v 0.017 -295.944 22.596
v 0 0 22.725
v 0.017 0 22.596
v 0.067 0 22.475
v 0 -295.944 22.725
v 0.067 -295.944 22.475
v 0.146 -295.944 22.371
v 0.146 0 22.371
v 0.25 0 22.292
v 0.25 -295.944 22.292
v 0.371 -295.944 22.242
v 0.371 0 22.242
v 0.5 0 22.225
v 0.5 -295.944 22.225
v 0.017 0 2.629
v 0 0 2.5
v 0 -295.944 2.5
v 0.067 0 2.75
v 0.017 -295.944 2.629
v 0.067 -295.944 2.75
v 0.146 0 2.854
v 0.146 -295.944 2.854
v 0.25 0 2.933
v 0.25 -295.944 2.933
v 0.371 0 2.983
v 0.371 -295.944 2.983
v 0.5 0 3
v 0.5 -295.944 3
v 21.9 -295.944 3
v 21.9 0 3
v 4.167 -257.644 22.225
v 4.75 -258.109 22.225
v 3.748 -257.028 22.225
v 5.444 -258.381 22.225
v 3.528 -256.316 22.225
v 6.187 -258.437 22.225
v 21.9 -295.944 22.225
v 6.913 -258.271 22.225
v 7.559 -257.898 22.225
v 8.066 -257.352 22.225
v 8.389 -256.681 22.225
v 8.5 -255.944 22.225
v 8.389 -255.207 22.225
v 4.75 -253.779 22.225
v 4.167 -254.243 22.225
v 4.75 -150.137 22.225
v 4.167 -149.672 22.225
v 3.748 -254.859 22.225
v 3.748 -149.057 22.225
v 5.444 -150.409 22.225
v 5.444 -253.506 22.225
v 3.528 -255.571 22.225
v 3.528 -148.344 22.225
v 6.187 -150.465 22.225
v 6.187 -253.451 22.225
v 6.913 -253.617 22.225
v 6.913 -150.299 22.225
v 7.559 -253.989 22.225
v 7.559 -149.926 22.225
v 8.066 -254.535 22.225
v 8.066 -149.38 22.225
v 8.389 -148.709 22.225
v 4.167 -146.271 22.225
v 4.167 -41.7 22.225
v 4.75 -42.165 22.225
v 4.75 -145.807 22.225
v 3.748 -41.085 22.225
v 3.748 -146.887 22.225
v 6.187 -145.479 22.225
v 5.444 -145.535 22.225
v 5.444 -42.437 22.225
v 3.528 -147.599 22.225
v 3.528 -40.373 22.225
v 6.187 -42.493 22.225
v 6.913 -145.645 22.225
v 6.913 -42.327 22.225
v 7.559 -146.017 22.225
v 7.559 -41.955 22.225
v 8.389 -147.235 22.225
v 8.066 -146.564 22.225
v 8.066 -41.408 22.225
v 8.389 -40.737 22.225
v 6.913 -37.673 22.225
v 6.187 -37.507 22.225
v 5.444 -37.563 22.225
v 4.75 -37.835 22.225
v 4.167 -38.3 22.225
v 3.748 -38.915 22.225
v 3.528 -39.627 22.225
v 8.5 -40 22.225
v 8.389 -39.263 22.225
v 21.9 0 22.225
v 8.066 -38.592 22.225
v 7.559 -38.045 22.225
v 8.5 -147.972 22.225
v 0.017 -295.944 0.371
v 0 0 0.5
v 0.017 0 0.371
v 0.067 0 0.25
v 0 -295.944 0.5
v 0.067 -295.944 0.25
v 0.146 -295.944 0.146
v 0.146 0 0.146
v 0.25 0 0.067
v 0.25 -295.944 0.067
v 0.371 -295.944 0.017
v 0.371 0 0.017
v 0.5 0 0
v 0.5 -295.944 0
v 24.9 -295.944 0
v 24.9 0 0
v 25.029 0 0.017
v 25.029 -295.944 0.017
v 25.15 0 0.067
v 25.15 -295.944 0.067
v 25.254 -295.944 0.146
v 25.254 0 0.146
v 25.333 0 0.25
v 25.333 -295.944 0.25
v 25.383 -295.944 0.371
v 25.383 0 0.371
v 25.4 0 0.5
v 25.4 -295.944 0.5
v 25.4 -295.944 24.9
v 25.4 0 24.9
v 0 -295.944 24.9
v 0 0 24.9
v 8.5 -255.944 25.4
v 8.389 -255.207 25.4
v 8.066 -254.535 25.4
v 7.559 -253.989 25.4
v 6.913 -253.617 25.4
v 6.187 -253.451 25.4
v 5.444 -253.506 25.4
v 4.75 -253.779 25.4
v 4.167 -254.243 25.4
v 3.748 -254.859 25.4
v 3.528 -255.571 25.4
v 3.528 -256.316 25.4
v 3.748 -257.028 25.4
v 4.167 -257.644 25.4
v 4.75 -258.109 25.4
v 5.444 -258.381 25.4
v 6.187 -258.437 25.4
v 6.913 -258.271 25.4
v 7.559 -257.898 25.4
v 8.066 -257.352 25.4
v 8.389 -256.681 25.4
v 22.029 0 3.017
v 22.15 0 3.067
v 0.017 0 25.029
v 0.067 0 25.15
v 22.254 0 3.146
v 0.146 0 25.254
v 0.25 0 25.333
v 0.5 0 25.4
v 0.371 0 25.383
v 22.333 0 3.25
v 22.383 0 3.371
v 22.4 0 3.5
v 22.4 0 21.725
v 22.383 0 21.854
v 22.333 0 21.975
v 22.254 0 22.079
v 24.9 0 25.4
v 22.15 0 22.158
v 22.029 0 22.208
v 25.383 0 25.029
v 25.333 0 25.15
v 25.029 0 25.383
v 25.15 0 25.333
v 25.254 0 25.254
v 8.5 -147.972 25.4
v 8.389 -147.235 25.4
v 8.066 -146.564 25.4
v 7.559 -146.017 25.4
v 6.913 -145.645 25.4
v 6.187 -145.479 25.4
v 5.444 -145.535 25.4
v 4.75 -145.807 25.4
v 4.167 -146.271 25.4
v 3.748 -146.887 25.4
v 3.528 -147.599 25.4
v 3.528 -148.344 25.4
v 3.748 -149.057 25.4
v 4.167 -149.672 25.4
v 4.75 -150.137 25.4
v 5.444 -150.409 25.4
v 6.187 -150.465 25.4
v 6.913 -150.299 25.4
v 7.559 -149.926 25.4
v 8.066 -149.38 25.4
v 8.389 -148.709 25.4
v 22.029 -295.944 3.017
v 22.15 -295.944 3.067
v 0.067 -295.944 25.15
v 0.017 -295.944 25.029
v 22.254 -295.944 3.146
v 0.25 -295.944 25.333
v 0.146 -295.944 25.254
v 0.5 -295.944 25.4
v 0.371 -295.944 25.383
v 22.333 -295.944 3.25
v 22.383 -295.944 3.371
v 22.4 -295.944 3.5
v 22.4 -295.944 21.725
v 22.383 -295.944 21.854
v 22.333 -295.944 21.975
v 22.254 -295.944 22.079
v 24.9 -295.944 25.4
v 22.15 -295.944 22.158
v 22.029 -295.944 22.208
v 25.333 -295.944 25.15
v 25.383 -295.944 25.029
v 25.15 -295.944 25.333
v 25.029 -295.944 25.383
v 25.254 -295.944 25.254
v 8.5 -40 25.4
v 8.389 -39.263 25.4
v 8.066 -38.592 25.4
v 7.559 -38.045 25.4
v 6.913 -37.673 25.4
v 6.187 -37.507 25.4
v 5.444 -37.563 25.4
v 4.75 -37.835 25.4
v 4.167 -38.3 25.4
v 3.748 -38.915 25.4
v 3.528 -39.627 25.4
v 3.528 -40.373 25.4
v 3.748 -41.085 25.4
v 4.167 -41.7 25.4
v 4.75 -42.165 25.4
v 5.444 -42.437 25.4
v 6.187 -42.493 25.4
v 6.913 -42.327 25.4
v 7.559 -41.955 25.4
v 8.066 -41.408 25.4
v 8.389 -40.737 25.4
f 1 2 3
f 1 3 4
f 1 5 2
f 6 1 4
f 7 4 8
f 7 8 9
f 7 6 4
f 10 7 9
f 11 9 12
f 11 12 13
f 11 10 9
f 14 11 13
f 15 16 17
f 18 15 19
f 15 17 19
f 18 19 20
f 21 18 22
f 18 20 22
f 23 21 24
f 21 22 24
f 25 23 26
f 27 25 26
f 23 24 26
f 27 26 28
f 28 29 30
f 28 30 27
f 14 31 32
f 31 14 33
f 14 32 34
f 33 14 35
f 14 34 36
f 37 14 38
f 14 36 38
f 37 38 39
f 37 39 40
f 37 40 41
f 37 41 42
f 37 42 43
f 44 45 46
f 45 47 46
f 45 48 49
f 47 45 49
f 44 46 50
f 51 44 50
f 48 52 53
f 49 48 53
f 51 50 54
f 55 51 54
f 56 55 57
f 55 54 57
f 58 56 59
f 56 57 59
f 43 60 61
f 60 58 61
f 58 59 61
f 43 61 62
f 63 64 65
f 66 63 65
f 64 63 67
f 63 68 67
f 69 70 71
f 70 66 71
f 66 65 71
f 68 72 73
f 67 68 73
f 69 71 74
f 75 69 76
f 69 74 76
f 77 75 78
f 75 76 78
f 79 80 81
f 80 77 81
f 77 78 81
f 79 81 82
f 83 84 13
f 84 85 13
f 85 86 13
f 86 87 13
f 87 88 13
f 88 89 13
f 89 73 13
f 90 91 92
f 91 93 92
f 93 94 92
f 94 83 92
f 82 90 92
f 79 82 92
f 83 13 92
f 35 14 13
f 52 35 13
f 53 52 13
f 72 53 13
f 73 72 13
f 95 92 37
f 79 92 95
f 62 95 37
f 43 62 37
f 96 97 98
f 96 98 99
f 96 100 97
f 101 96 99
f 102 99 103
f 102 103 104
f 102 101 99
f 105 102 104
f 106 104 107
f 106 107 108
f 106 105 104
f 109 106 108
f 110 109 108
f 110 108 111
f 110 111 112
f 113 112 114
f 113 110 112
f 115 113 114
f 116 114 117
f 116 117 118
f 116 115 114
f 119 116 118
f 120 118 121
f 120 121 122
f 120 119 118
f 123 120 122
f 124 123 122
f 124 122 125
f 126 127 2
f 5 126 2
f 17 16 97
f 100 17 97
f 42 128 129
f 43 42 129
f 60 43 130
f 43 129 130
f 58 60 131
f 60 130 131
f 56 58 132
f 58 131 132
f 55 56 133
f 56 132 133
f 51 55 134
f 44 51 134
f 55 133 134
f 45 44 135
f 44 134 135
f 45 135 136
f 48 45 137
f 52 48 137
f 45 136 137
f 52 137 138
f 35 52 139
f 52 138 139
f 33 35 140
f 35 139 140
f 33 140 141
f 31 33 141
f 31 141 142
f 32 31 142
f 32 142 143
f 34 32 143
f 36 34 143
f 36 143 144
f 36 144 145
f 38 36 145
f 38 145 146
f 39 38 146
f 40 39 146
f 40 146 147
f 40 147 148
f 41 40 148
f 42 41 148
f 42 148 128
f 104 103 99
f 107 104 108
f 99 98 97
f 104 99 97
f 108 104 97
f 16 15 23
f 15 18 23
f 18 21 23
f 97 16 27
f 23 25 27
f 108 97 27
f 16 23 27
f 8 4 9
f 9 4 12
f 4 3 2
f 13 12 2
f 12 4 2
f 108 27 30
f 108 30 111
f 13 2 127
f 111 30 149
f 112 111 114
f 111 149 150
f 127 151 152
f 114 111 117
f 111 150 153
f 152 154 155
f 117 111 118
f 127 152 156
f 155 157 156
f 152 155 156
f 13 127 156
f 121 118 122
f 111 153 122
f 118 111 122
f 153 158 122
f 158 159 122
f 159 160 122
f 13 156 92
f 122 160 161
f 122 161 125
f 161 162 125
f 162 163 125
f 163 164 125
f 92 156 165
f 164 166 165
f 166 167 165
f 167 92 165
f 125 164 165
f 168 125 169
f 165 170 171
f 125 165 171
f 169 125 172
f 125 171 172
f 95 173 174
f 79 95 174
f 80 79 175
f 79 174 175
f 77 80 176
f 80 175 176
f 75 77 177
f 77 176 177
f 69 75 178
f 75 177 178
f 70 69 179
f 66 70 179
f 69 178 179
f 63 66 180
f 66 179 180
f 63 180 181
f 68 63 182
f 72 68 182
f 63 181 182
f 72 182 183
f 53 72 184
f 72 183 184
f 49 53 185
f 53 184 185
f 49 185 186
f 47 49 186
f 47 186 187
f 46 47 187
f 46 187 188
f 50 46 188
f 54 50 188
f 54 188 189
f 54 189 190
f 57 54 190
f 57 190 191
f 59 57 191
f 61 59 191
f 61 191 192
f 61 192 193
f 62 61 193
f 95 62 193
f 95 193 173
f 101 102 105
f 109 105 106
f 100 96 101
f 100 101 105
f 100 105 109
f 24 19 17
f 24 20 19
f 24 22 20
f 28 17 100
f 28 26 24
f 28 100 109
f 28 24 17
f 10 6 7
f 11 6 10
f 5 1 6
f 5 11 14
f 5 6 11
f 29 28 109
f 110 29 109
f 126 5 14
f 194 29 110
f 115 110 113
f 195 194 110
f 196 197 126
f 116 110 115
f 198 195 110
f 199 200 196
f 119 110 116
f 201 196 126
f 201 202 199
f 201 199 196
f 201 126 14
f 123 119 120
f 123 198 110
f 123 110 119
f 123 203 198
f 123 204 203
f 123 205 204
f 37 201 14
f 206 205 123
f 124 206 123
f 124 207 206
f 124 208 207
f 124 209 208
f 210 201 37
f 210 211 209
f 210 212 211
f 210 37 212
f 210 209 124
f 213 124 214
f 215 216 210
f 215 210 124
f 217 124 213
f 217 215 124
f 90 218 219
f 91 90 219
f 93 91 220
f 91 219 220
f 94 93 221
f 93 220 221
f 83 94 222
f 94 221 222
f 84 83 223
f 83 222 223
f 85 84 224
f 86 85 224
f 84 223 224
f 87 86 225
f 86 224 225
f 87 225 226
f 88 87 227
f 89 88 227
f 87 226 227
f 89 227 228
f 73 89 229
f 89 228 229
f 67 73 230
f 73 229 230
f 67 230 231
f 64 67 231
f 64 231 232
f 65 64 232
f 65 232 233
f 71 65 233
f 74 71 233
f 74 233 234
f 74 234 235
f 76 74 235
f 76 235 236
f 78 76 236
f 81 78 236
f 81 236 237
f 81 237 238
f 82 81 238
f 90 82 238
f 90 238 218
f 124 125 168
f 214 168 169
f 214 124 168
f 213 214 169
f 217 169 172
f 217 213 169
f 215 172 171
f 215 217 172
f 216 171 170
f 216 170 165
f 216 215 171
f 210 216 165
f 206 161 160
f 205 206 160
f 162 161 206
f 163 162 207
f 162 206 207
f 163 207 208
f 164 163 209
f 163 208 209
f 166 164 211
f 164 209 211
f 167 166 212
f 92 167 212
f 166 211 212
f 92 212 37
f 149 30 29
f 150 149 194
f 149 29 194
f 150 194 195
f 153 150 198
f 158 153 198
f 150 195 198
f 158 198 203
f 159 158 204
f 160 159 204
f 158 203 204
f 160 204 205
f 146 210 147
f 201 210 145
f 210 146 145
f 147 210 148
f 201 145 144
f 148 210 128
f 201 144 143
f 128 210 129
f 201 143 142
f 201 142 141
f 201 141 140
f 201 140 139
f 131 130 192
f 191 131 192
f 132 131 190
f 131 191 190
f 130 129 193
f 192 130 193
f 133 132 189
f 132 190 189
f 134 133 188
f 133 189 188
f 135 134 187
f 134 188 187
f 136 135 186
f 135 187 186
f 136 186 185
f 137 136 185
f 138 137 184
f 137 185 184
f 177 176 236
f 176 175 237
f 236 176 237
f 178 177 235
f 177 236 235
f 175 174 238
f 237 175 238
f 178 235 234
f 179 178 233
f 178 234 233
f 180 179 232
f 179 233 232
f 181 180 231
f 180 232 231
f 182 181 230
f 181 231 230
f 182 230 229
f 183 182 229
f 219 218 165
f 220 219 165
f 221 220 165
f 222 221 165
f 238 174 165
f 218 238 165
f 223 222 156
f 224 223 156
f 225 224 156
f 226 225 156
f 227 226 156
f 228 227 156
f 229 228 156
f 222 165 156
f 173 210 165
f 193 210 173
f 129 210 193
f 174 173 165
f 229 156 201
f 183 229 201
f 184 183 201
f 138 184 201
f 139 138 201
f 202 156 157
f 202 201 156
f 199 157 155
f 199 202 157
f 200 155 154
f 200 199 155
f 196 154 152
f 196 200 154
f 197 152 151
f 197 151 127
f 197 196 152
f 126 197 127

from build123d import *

# Parameters (mm, degrees)
F1_DEPTH = 295.94371
F2_R     = 2.5
F3_DEPTH = 5
F5_R     = 0.5


with BuildPart() as f1:
    # F0 (on Front) → F1 (new body)
    with BuildSketch(Plane.XZ):
        Polygon((0, 3), (0, 0), (25.4, 0), (25.4, 25.4), (0, 25.4), (0, 22.225), (22.4, 22.225), (22.4, 3), align=None)
    extrude(amount=F1_DEPTH)

    # F2 (on face) → F3 (cut)
    with BuildSketch(Plane.XY.offset(25.4)):
        with Locations((6, -40)):
            Circle(F2_R)
        with Locations((6, -147.971855)):
            Circle(F2_R)
        with Locations((6, -255.94371)):
            Circle(F2_R)
    extrude(amount=-F3_DEPTH, mode=Mode.SUBTRACT)

    # F5
    f5_edges = [f1.edges().sort_by_distance(p)[0] for p in [
        (25.4, -147.971855, 25.4),
        (25.4, -147.971855, 0),
        (0, -147.971855, 25.4),
        (0, -147.971855, 22.225),
        (22.4, -147.971855, 22.225),
        (0, -147.971855, 3),
        (0, -147.971855, 0),
        (22.4, -147.971855, 3),
    ]]
    fillet(f5_edges, radius=F5_R)


solid = f1.part
